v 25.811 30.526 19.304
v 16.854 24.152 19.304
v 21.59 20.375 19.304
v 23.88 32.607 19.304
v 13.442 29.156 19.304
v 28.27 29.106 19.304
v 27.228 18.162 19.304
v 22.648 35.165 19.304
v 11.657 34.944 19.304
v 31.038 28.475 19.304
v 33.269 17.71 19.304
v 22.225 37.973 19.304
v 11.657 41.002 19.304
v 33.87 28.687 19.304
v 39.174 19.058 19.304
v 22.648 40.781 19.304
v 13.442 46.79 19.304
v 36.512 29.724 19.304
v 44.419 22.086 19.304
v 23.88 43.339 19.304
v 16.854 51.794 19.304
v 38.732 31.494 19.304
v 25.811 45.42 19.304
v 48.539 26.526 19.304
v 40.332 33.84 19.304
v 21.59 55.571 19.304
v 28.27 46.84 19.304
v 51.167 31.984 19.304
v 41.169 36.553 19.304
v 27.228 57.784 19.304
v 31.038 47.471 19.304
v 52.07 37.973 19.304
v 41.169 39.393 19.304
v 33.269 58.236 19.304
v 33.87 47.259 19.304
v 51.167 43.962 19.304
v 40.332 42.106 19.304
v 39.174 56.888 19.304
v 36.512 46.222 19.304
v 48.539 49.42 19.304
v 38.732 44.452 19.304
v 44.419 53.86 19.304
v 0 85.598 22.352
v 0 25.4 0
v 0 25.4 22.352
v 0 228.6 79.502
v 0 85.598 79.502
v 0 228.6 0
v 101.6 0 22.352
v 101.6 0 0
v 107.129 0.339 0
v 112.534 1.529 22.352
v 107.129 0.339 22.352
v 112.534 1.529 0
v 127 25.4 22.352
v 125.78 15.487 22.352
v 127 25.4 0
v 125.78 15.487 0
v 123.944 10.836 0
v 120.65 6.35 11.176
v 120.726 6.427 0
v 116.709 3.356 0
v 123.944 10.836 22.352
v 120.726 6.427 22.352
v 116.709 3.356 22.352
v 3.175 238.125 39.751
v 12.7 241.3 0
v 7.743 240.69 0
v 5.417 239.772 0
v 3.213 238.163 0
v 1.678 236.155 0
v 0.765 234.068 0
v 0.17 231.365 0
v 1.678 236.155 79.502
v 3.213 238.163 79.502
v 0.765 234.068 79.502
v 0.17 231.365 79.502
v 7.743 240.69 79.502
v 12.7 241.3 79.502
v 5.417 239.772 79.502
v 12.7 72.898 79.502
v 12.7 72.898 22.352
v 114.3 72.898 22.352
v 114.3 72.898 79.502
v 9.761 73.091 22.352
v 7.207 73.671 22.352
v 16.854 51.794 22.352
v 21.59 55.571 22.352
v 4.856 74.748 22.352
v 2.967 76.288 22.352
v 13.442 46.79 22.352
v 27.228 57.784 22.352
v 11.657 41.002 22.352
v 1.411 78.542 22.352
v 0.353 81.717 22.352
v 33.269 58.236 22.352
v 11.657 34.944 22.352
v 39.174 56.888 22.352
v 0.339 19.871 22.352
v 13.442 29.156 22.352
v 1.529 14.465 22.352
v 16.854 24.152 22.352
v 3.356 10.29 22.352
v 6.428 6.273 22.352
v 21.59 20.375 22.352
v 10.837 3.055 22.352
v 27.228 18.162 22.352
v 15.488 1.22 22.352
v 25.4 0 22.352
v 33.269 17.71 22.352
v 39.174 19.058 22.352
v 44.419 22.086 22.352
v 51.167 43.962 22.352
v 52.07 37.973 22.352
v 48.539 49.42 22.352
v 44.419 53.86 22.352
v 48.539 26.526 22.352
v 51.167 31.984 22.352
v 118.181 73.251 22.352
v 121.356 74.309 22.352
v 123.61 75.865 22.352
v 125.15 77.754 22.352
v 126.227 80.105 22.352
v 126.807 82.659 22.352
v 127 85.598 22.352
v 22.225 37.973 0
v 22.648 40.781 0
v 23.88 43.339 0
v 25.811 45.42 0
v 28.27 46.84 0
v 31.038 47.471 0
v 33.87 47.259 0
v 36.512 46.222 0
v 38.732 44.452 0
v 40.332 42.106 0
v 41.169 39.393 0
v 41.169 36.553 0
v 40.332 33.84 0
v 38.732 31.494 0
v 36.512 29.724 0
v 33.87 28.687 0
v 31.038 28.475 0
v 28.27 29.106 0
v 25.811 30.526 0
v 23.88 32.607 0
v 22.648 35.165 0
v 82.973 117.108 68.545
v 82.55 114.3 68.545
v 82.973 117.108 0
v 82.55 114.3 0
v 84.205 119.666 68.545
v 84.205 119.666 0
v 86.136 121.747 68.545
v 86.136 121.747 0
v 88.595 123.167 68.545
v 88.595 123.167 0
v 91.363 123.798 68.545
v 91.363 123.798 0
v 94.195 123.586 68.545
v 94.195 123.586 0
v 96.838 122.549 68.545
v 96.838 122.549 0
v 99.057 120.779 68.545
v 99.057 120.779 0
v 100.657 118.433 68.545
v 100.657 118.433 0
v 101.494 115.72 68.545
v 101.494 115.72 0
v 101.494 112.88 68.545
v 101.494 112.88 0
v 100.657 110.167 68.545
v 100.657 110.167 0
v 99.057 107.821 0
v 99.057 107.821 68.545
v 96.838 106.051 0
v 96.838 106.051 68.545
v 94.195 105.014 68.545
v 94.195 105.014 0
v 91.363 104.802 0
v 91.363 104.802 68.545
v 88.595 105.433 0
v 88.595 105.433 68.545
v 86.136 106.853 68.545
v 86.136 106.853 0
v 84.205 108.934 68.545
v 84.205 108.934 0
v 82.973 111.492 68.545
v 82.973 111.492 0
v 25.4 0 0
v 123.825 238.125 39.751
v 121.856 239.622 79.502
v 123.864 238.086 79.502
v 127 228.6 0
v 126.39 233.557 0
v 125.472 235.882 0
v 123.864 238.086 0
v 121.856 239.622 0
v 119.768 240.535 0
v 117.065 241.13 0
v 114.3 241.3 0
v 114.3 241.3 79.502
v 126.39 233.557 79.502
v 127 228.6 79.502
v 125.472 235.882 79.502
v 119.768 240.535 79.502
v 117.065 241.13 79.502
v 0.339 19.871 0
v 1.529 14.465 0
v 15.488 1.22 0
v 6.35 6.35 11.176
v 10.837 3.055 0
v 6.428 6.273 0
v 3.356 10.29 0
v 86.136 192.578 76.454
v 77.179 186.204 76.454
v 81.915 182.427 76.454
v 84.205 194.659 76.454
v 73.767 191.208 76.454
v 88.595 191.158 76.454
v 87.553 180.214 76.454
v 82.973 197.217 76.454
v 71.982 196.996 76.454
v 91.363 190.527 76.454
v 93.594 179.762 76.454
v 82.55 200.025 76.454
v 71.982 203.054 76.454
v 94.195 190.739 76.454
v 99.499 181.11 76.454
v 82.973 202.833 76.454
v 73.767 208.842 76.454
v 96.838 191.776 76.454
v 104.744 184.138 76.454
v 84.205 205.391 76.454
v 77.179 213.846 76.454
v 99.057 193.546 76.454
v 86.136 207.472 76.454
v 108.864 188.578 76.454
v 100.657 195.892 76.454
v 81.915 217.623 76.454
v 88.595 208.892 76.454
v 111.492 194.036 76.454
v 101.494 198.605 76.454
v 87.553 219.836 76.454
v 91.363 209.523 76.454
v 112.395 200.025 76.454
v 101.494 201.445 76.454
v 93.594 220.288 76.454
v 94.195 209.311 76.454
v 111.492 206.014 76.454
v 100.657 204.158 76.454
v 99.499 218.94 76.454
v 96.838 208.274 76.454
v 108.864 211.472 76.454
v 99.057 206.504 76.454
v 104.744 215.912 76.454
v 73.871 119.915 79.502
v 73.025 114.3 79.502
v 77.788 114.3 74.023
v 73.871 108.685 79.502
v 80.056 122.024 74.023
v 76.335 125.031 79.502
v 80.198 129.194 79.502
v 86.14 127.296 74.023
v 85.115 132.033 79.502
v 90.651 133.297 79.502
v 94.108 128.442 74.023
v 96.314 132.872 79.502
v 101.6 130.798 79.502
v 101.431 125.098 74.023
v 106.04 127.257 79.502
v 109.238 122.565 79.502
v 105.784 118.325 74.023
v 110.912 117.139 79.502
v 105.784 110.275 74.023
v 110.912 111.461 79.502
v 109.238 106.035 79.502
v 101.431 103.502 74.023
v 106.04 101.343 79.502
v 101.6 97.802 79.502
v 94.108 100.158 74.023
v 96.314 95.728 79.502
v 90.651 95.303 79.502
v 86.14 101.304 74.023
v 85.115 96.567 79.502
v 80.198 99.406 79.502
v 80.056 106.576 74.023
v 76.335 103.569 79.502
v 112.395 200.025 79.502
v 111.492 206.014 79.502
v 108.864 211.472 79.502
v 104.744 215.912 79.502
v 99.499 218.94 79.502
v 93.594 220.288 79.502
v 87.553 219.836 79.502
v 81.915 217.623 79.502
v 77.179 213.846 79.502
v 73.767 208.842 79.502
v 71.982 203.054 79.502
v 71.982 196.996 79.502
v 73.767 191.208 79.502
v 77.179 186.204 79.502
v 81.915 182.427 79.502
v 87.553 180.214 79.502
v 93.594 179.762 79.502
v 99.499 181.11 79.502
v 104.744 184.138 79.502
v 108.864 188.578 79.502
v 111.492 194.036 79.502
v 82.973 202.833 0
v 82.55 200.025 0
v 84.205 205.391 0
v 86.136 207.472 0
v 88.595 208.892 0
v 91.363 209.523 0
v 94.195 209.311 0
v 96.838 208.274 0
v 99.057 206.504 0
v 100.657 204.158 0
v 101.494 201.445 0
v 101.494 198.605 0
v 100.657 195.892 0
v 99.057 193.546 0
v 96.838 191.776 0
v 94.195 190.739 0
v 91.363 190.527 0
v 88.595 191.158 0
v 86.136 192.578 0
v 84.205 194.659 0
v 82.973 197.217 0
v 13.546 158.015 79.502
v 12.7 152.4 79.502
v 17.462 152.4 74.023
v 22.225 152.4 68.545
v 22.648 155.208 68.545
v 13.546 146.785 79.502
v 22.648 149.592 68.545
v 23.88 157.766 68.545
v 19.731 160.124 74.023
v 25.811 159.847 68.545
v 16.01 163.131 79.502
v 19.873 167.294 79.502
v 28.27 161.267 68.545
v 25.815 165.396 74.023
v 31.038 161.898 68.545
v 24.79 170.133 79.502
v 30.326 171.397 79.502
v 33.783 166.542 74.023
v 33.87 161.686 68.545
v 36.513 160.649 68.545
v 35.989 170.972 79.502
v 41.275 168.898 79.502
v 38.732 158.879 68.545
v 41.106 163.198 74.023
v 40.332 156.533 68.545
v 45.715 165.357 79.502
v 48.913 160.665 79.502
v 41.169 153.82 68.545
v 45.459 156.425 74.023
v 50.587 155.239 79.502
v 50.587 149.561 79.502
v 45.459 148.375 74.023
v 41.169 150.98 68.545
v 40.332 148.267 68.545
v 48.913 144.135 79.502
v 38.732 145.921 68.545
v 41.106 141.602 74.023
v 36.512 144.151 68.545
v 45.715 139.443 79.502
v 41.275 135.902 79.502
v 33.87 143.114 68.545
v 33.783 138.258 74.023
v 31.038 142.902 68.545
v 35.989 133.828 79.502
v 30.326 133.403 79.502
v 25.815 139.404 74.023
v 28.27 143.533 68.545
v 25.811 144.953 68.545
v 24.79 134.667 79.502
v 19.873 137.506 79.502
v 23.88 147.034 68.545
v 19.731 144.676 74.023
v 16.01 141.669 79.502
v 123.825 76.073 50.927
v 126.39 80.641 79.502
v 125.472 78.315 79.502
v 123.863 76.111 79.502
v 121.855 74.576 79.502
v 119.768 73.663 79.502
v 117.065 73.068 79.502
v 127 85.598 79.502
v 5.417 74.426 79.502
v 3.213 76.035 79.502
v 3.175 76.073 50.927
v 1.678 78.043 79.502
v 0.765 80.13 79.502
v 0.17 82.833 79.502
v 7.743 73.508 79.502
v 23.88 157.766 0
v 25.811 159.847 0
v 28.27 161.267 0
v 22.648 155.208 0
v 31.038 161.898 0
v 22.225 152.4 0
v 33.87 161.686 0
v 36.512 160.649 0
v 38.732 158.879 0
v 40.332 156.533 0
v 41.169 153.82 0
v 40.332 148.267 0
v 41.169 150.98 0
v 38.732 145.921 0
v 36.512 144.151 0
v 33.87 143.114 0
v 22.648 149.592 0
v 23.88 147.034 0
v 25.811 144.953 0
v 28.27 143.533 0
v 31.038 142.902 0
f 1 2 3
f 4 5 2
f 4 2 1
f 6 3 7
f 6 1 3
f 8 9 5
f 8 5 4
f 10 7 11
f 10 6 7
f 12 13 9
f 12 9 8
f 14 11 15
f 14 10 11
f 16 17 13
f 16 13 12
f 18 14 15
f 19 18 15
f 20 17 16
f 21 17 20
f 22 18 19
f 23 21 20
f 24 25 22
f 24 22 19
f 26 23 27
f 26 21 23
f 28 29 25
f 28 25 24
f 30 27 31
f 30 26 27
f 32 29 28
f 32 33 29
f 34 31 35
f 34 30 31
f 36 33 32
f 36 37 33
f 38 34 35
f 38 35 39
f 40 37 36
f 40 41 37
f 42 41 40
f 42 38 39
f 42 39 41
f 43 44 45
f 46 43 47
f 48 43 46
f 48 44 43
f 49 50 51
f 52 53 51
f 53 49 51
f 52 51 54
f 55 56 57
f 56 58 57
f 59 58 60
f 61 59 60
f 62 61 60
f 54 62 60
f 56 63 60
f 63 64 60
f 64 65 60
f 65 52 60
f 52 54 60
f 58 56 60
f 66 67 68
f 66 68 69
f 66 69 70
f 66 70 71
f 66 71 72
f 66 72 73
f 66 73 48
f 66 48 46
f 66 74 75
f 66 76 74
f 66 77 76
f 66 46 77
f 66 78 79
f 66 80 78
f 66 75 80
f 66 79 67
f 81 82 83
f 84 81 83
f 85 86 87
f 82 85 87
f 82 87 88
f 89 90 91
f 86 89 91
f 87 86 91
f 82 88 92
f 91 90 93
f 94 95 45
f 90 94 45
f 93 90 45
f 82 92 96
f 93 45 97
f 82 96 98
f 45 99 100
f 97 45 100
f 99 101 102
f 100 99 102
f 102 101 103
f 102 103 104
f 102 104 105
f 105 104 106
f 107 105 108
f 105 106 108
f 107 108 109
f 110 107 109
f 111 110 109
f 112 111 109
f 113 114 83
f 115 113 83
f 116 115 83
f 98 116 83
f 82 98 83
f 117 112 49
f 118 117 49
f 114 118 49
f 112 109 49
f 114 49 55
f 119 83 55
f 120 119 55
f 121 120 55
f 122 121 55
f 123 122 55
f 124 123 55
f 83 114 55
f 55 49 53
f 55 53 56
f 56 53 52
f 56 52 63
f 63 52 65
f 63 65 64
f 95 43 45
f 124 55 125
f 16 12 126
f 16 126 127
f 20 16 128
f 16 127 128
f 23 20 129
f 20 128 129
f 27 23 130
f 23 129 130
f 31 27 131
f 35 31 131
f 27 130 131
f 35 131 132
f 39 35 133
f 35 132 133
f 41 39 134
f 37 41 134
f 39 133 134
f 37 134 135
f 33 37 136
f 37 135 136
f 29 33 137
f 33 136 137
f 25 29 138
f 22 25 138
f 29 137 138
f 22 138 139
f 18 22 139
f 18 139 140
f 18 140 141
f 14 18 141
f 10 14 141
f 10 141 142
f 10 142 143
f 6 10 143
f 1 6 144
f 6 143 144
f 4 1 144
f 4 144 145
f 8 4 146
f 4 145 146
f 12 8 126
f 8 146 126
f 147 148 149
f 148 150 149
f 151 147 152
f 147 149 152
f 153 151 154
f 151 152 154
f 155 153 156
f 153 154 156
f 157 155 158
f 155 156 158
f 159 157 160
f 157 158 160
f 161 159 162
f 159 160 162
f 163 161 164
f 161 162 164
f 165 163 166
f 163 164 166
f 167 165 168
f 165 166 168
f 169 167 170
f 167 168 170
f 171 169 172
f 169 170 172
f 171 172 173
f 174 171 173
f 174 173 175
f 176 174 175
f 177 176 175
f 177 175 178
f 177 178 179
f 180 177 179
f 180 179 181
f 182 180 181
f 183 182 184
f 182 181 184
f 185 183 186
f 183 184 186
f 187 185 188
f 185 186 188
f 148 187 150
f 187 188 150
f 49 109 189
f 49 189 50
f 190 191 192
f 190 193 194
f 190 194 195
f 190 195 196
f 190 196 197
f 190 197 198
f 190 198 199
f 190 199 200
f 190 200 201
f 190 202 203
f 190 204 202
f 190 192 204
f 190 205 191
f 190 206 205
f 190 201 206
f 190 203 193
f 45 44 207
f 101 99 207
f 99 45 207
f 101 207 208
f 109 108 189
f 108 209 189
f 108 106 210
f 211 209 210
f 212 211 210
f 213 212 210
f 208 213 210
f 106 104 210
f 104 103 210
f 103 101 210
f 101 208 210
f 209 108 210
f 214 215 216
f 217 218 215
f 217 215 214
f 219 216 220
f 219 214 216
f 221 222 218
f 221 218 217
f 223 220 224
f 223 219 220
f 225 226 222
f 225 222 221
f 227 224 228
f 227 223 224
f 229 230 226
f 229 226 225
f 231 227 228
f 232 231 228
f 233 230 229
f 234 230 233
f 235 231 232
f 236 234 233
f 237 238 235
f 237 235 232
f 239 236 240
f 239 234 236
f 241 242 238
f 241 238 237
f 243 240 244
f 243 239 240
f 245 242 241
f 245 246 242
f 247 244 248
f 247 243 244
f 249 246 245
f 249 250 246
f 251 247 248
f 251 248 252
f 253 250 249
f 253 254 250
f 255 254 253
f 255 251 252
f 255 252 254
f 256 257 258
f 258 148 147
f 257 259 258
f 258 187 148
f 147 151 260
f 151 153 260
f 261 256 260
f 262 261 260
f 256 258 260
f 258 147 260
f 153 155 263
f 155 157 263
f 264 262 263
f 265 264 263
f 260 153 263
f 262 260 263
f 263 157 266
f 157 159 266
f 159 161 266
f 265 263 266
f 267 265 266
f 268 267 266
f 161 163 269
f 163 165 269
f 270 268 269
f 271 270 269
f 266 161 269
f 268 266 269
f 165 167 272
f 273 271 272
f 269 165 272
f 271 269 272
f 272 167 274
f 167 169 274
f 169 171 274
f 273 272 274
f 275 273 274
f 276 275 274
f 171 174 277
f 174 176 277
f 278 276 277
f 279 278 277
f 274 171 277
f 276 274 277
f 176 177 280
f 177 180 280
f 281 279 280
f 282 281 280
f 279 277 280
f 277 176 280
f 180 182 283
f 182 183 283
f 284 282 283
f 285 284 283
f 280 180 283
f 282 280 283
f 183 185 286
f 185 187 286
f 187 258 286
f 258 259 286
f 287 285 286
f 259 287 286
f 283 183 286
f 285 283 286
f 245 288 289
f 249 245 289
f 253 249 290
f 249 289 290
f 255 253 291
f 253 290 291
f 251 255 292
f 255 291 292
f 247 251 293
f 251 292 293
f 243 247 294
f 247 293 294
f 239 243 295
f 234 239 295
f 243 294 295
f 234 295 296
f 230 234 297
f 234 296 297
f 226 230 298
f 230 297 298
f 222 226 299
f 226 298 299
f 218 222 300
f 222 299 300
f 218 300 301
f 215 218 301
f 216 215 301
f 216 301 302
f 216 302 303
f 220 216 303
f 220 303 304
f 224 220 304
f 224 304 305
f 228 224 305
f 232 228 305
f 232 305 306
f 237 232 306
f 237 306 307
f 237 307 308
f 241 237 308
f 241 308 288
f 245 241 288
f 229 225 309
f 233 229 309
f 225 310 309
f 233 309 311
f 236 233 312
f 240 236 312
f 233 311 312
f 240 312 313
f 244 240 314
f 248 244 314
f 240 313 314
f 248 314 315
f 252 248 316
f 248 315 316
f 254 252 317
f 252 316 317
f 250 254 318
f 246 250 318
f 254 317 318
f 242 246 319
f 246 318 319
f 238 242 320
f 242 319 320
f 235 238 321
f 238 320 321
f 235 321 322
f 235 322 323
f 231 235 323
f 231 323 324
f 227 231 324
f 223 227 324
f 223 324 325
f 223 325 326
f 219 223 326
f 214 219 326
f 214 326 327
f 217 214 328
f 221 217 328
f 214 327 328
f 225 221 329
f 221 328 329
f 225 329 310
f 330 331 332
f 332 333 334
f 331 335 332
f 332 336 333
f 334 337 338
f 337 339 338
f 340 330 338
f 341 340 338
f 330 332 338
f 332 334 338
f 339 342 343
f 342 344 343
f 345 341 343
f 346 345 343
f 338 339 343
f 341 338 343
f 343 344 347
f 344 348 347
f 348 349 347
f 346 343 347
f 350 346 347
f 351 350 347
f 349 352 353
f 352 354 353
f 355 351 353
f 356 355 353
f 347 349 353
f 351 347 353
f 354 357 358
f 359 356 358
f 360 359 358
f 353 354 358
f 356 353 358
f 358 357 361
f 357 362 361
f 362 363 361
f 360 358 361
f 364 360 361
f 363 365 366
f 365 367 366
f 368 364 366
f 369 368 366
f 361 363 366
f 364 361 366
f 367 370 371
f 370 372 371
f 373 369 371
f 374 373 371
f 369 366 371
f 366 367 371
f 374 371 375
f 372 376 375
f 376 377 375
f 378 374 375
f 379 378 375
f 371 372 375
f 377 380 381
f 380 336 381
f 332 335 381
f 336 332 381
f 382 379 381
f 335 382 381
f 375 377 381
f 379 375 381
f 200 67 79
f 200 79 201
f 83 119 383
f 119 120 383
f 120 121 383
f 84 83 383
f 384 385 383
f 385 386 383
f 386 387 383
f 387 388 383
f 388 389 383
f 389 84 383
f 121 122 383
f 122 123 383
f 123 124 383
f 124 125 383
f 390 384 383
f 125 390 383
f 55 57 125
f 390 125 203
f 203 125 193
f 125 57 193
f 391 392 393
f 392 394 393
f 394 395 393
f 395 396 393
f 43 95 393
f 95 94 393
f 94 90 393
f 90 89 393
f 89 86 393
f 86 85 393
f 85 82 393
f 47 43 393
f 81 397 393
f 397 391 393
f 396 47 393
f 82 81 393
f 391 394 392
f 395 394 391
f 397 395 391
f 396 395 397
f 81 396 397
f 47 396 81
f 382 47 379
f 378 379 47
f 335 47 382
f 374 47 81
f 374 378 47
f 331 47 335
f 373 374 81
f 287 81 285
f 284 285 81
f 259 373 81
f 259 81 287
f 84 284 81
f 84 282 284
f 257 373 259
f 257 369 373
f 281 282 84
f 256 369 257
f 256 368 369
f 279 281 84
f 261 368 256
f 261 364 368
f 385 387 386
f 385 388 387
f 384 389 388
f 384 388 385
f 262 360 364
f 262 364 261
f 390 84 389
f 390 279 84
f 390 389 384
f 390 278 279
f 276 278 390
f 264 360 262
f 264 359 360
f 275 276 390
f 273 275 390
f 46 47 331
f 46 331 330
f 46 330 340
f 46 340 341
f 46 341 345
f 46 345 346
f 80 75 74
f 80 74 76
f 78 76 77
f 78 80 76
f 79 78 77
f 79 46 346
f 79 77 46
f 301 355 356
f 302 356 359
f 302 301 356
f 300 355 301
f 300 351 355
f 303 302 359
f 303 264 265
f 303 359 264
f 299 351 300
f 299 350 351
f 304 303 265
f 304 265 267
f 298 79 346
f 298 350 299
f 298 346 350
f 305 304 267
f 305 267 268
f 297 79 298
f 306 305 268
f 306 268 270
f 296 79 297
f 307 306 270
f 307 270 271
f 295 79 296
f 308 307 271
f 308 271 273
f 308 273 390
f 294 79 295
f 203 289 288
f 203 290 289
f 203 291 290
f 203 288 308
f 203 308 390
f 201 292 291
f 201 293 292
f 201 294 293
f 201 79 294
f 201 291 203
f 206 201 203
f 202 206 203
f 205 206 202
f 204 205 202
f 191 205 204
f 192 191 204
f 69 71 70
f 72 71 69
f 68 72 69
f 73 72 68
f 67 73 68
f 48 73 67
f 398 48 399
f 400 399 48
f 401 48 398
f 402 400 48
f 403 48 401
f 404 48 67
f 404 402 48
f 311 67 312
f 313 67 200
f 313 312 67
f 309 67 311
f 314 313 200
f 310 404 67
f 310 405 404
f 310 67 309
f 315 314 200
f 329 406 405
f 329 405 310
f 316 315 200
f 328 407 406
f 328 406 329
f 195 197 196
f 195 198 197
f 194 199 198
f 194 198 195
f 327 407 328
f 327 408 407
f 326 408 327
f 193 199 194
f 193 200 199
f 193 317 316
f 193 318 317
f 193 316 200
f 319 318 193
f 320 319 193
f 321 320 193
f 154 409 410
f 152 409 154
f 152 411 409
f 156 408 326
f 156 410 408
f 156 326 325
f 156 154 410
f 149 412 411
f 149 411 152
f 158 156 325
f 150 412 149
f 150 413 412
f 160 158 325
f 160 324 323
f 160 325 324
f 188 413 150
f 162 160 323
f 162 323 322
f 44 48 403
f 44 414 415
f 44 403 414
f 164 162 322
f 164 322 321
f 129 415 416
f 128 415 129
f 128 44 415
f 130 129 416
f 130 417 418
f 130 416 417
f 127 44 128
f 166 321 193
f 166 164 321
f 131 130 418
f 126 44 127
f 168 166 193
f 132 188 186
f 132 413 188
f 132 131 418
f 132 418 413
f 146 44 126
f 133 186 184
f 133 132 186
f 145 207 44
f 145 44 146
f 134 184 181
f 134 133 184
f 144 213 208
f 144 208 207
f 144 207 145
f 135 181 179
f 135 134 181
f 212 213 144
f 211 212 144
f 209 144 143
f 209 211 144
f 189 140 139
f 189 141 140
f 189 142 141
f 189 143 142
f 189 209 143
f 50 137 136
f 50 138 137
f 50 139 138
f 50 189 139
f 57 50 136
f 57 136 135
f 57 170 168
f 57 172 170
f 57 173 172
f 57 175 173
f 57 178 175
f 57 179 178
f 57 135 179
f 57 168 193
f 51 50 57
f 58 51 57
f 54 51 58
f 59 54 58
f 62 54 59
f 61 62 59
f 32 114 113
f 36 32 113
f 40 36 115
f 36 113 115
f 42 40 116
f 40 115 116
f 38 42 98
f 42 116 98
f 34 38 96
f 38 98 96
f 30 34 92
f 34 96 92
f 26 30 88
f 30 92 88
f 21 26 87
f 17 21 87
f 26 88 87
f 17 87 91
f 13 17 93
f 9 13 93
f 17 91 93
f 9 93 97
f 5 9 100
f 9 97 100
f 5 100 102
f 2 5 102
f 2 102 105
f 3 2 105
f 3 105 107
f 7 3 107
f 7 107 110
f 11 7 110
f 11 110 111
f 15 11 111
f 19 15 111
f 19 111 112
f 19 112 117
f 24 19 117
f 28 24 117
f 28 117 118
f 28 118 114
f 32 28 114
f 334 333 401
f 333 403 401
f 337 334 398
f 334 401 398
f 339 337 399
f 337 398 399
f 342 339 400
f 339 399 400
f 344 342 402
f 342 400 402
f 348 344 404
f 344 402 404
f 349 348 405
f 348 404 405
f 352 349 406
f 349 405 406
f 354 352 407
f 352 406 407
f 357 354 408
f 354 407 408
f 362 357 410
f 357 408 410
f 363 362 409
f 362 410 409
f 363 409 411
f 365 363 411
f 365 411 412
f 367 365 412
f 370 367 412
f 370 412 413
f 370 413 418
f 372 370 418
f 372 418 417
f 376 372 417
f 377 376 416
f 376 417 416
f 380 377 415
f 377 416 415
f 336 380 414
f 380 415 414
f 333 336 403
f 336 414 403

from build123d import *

# Parameters (mm, degrees)
F0_W           = 127
F0_H           = 22.352
F1_DEPTH       = 241.3
F2_W           = 127
F2_H           = 168.402
F3_DEPTH       = 57.15
F5_D           = 19.05
F5_CSINK_D     = 38.1
F5_CSINK_ANGLE = 82
F6_D           = 19.05
F6_START       = 57.15
F6_CBORE_D     = 40.64
F6_CBORE_DEPTH = 3.048
F7_T1_DEPTH    = 149.352
F8_T1_DEPTH    = 88.9
F9_T1_DEPTH    = 88.9
F10_T1_DEPTH   = 149.352
F11_T1_DEPTH   = 143.002
F12_T1_DEPTH   = 143.002


# Not quite as in the source:
# - a fillet or chamfer that OpenCascade refuses, or shapes differently, is made with other operations: its cross-section is extruded or revolved along the edge and cut away or added


with BuildPart() as f1:
    # F0 (on Front) → F1 (new body)
    with BuildSketch(Plane.XZ):
        with Locations((63.5, 11.176)):
            Rectangle(F0_W, F0_H)
    extrude(amount=-F1_DEPTH)

    # F2 (on face) → F3 (join)
    with BuildSketch(Plane.XY.offset(22.352)):
        with Locations((63.5, 157.099)):
            Rectangle(F2_W, F2_H)
    extrude(amount=F3_DEPTH)

    # F5 (through all)
    with Locations(Plane.XY.offset(79.502)):
        with Locations((31.75, 152.4), (92.075, 114.3)):
            CounterSinkHole(F5_D / 2, F5_CSINK_D / 2, counter_sink_angle=F5_CSINK_ANGLE)

    # F6 (through all)
    # its depths count from where the whole tool has entered the part; down to there all is cleared
    with Locations(Plane.XY.offset(79.502)):
        with Locations((92.075, 200.025, 0), (31.75, 37.973, -F6_START)):
            CounterBoreHole(F6_D / 2, F6_CBORE_D / 2, F6_CBORE_DEPTH)

    # F7: fillet of radius 25.4 on 1 edges, made by hand

    # F7_s2 → F7_t1 (cut)
    with BuildSketch(Plane.XY.offset(-63.5)):
        with BuildLine():
            add(Edge.make_bspline(
                [(101.6, 0), (127, 0), (127, 25.4)],
                knots=[0, 0, 0, 1, 1, 1], degree=2, weights=[1, 1, 1]))
            Line((127, 25.4), (127, 0))
            Line((127, 0), (101.6, 0))
        make_face()
    extrude(amount=F7_T1_DEPTH, mode=Mode.SUBTRACT)

    # F8: fillet of radius 12.7 on 1 edges, made by hand

    # F8_s2 → F8_t1 (cut)
    with BuildSketch(Plane.XY.offset(22.352)):
        with BuildLine():
            add(Edge.make_bspline(
                [(114.3, 72.898), (127, 72.898), (127, 85.598)],
                knots=[0, 0, 0, 1, 1, 1], degree=2, weights=[1, 1, 1]))
            Line((127, 85.598), (127, 72.898))
            Line((127, 72.898), (114.3, 72.898))
        make_face()
    extrude(amount=F8_T1_DEPTH, mode=Mode.SUBTRACT)

    # F9: fillet of radius 12.7 on 1 edges, made by hand

    # F9_s2 → F9_t1 (cut)
    with BuildSketch(Plane.XY.offset(22.352)):
        with BuildLine():
            add(Edge.make_bspline(
                [(0, 85.598), (0, 72.898), (12.7, 72.898)],
                knots=[0, 0, 0, 1, 1, 1], degree=2, weights=[1, 1, 1]))
            Line((12.7, 72.898), (0, 72.898))
            Line((0, 72.898), (0, 85.598))
        make_face()
    extrude(amount=F9_T1_DEPTH, mode=Mode.SUBTRACT)

    # F10: fillet of radius 25.4 on 1 edges, made by hand

    # F10_s2 → F10_t1 (cut)
    with BuildSketch(Plane.XY.offset(-63.5)):
        with BuildLine():
            add(Edge.make_bspline(
                [(0, 25.4), (0, 0), (25.4, 0)],
                knots=[0, 0, 0, 1, 1, 1], degree=2, weights=[1, 1, 1]))
            Line((25.4, 0), (0, 0))
            Line((0, 0), (0, 25.4))
        make_face()
    extrude(amount=F10_T1_DEPTH, mode=Mode.SUBTRACT)

    # F11: fillet of radius 12.7 on 1 edges, made by hand

    # F11_s2 → F11_t1 (cut)
    with BuildSketch(Plane.XY.offset(-31.75)):
        with BuildLine():
            add(Edge.make_bspline(
                [(114.3, 241.3), (127, 241.3), (127, 228.6)],
                knots=[0, 0, 0, 1, 1, 1], degree=2, weights=[1, 1, 1]))
            Line((127, 228.6), (127, 241.3))
            Line((127, 241.3), (114.3, 241.3))
        make_face()
    extrude(amount=F11_T1_DEPTH, mode=Mode.SUBTRACT)

    # F12: fillet of radius 12.7 on 1 edges, made by hand

    # F12_s2 → F12_t1 (cut)
    with BuildSketch(Plane.XY.offset(-31.75)):
        with BuildLine():
            add(Edge.make_bspline(
                [(0, 228.6), (0, 241.3), (12.7, 241.3)],
                knots=[0, 0, 0, 1, 1, 1], degree=2, weights=[1, 1, 1]))
            Line((12.7, 241.3), (0, 241.3))
            Line((0, 241.3), (0, 228.6))
        make_face()
    extrude(amount=F12_T1_DEPTH, mode=Mode.SUBTRACT)


solid = f1.part
